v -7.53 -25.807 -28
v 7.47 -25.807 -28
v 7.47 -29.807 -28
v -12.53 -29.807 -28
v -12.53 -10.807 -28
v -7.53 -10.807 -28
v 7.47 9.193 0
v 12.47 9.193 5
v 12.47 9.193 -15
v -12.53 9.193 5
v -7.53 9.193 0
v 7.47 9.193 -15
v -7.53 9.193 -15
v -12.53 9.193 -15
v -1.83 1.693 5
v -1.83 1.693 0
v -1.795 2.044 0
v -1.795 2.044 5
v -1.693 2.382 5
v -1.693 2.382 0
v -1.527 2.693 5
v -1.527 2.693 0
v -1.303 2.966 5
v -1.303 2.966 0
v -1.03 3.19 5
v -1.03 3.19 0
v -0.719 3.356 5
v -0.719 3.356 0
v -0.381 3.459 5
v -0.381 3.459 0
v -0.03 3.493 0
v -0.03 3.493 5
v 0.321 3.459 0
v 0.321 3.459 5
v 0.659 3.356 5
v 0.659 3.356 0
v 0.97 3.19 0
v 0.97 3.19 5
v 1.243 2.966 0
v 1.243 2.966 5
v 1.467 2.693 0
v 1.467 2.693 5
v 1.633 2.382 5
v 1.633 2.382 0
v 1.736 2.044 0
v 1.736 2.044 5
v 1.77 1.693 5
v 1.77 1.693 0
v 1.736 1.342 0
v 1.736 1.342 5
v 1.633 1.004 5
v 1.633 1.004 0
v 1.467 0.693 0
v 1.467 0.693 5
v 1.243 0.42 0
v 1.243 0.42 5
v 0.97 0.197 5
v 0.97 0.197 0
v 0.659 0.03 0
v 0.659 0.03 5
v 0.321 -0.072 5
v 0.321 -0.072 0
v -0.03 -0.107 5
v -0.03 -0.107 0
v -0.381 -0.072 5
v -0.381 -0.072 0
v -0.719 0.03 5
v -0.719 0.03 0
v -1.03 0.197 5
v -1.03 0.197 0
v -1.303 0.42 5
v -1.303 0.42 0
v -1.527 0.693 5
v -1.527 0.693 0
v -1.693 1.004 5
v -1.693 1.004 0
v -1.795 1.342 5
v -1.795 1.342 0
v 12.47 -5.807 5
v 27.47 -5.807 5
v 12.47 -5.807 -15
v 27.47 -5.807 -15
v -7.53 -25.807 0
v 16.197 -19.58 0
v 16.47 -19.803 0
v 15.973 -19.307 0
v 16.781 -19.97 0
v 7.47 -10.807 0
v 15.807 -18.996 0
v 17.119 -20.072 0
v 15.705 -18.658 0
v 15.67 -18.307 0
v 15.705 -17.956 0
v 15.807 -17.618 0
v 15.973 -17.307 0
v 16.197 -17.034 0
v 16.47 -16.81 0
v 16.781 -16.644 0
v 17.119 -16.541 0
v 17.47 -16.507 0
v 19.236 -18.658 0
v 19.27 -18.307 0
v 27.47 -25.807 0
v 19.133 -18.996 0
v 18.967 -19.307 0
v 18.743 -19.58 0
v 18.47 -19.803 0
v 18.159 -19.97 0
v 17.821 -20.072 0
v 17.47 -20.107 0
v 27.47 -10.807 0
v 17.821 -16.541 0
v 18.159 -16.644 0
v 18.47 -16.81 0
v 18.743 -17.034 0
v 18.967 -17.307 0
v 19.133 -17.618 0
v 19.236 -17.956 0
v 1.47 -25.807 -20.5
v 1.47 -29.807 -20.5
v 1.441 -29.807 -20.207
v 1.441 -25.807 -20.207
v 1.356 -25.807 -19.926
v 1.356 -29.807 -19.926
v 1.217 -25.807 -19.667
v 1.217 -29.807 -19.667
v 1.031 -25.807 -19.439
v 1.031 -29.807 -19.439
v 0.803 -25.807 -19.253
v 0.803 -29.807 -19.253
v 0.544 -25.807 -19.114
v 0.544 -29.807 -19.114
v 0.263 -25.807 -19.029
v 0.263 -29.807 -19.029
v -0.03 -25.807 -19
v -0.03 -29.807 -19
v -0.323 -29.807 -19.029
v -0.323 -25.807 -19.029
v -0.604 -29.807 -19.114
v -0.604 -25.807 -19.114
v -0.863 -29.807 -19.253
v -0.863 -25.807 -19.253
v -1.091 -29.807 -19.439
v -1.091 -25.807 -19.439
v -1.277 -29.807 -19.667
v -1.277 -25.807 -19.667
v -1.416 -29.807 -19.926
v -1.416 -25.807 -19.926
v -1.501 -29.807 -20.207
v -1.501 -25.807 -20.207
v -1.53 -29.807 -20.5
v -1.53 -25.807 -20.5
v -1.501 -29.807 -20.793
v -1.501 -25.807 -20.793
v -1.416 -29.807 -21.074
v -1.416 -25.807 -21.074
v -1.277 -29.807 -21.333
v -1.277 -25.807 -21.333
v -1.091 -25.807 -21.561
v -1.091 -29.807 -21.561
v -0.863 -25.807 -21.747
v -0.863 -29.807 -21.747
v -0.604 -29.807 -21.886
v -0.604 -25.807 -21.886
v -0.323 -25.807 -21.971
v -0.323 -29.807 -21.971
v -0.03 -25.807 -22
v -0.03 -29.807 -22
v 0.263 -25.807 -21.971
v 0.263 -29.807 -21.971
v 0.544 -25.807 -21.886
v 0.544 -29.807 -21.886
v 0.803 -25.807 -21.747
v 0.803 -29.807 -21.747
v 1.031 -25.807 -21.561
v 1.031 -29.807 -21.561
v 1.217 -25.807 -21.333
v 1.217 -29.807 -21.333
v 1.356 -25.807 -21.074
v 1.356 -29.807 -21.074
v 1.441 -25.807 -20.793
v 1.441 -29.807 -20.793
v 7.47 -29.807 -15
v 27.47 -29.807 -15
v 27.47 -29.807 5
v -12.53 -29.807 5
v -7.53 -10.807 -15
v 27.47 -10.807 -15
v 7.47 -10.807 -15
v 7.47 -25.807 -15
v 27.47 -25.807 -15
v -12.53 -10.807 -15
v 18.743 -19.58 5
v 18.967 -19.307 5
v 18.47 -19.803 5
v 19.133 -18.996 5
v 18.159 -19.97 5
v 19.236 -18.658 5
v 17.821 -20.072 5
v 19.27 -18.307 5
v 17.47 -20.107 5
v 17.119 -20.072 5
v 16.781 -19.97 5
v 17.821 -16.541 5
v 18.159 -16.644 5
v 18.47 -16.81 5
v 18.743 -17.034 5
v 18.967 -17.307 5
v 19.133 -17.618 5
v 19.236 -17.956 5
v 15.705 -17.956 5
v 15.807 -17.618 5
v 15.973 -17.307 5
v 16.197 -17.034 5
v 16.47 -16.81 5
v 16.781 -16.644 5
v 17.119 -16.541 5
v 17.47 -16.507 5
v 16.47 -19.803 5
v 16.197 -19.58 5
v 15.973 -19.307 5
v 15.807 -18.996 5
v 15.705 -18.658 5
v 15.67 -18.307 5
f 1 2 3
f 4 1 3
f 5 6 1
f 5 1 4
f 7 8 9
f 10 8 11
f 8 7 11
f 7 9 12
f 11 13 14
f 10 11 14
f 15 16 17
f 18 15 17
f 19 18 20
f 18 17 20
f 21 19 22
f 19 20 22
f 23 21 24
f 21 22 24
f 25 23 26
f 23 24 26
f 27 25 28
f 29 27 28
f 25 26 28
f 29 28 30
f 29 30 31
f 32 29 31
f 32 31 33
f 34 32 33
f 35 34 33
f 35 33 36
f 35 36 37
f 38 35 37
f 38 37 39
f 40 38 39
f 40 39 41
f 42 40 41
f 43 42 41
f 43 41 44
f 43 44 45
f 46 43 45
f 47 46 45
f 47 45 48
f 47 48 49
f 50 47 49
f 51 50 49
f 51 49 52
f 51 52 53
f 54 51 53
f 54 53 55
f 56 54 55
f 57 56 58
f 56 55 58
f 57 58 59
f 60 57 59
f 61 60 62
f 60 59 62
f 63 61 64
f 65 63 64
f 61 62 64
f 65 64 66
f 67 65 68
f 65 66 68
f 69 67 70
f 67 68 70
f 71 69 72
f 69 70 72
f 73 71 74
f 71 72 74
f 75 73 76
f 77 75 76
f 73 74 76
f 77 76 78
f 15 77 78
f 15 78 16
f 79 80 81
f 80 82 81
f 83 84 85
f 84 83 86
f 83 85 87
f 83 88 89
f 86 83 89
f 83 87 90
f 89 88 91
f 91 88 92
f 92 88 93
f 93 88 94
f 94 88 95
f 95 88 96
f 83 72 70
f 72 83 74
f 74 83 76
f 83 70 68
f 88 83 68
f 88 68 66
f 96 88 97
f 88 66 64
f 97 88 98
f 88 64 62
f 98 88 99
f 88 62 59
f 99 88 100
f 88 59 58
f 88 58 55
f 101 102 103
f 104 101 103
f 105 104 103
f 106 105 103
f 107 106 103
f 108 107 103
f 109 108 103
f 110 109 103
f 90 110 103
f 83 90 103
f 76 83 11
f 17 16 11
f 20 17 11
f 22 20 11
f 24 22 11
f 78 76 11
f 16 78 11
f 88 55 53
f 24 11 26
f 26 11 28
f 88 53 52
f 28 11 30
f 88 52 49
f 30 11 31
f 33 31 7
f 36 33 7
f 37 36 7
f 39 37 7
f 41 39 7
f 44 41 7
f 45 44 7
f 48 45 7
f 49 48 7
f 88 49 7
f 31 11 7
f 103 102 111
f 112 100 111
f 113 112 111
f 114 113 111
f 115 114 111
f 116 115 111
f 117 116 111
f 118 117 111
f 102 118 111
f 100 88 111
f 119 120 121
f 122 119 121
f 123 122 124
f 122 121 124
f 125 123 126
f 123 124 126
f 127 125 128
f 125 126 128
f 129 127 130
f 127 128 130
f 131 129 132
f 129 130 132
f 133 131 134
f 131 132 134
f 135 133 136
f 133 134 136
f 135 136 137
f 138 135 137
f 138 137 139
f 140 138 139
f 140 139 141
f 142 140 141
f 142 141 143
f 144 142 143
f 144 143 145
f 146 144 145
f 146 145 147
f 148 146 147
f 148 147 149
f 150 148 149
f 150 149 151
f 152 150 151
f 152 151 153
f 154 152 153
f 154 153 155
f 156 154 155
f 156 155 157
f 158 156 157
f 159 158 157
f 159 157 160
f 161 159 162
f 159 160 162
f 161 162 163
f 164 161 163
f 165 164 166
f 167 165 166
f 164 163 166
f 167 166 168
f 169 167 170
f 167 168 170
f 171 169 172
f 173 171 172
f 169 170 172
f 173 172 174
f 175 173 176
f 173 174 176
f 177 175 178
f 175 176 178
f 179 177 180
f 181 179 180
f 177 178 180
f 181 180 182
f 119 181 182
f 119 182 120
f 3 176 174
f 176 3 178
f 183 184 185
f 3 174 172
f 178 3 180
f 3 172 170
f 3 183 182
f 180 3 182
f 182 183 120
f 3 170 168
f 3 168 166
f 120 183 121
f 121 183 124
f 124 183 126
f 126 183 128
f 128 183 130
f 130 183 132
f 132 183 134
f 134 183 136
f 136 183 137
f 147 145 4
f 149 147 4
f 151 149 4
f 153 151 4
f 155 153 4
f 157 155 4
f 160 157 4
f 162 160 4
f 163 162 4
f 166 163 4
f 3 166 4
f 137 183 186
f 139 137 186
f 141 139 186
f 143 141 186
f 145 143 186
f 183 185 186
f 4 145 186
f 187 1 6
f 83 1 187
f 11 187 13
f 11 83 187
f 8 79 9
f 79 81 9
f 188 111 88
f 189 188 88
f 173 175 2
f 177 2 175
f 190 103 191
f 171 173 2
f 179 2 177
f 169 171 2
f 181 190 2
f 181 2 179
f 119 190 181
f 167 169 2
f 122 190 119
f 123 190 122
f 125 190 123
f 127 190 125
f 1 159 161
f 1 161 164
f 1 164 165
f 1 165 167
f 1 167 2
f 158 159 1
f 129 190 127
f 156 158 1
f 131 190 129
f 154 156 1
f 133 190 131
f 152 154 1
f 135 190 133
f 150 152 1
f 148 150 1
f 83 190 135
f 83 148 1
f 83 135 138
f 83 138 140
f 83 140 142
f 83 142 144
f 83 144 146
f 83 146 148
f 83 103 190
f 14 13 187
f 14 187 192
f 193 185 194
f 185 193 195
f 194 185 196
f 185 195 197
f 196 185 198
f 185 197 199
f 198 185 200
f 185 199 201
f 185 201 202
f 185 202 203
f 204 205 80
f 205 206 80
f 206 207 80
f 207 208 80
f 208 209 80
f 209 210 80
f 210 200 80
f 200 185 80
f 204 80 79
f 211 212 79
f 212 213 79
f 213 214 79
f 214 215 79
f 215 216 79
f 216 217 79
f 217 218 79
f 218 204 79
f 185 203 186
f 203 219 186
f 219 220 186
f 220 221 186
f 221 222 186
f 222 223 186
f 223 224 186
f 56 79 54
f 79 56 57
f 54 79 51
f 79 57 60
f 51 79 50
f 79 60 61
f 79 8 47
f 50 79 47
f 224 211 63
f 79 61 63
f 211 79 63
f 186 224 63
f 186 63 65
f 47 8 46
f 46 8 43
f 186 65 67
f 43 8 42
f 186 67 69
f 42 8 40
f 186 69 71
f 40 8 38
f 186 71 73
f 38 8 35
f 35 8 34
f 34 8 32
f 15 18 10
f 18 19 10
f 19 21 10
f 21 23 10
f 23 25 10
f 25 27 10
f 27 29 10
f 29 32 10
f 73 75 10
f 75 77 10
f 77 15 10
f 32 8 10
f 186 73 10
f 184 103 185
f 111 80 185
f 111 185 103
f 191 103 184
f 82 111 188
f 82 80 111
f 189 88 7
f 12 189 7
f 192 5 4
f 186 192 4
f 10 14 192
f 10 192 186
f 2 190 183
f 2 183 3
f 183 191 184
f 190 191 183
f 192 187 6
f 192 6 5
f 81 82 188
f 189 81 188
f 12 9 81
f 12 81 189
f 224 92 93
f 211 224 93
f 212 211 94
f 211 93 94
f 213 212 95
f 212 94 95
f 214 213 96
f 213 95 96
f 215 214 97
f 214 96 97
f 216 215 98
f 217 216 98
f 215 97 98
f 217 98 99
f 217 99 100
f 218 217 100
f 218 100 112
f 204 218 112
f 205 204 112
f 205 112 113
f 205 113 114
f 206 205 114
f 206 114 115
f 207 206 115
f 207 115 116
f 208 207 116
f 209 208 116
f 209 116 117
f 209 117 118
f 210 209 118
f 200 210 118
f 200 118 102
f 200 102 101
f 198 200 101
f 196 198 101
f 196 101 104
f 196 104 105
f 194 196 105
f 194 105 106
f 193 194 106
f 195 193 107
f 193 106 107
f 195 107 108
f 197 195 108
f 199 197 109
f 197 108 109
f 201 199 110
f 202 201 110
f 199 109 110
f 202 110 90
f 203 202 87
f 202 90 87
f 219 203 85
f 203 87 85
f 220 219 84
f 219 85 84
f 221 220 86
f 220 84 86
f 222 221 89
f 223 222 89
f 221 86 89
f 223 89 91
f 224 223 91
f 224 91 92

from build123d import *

# Parameters (mm, degrees)
BOSS_EXTRUDE1_DEPTH = 5
BOSS_EXTRUDE2_DEPTH = 15
SKETCH3_W           = 5
SKETCH3_H           = 35
BOSS_EXTRUDE3_DEPTH = 15
SKETCH4_W           = 5
SKETCH4_H           = 35
BOSS_EXTRUDE4_DEPTH = 5
BOSS_EXTRUDE5_DEPTH = 5
SKETCH7_R           = 1.8
CUT_EXTRUDE1_DEPTH  = 6
SKETCH9_W           = 5
SKETCH9_H           = 15
BOSS_EXTRUDE6_DEPTH = 13
BOSS_EXTRUDE7_DEPTH = 4
SKETCH13_R          = 1.5
CUT_EXTRUDE4_DEPTH  = 40


with BuildPart() as part:
    # Sketch1 → Boss-Extrude1 (new body)
    with BuildSketch(Plane.XY):
        Polygon((-7.529880478, -25.806772908), (27.470119522, -25.806772908), (27.470119522, -10.806772908), (7.470119522, -10.806772908), (7.470119522, 9.193227092), (-7.529880478, 9.193227092), align=None)
    extrude(amount=BOSS_EXTRUDE1_DEPTH)



with BuildPart() as body_2:
    # Sketch2 → Boss-Extrude2 (new body)
    with BuildSketch(Plane(origin=(0, 0, 0), x_dir=(-1, 0, 0), z_dir=(0, 0, -1))):
        Polygon((-7.470119522, 9.193227092), (-12.470119522, 9.193227092), (-12.470119522, -5.806772908), (-27.470119522, -5.806772908), (-27.470119522, -10.806772908), (-7.470119522, -10.806772908), align=None)
    extrude(amount=BOSS_EXTRUDE2_DEPTH)


with BuildPart() as body_3:
    # Sketch3 → Boss-Extrude3 (new body)
    with BuildSketch(Plane(origin=(0, 0, 0), x_dir=(-1, 0, 0), z_dir=(0, 0, -1))):
        with Locations((10.029880478, -8.306772908)):
            Rectangle(SKETCH3_W, SKETCH3_H)
    extrude(amount=BOSS_EXTRUDE3_DEPTH)


with BuildPart() as part_1:
    add(part.part)

    add(body_3.part)  # Boss-Extrude4 merges body 3
    # Sketch4 → Boss-Extrude4 (add)
    with BuildSketch(Plane.XY):
        with Locations((-10.029880478, -8.306772908)):
            Rectangle(SKETCH4_W, SKETCH4_H)
    extrude(amount=BOSS_EXTRUDE4_DEPTH)


    add(body_2.part)  # Boss-Extrude5 merges body 2
    # Sketch5 → Boss-Extrude5 (add)
    with BuildSketch(Plane.XY):
        Polygon((7.470119522, 9.193227092), (7.470119522, -10.806772908), (27.470119522, -10.806772908), (27.470119522, -5.806772908), (12.470119522, -5.806772908), (12.470119522, 9.193227092), align=None)
    extrude(amount=BOSS_EXTRUDE5_DEPTH)

    # Sketch7 → Cut-Extrude1 (cut, through all)
    with BuildSketch(Plane(origin=(0, 0, 0), x_dir=(-1, 0, 0), z_dir=(0, 0, -1))):
        with Locations((0.029880478, 1.693227092)):
            Circle(SKETCH7_R)
        with Locations((-17.470119522, -18.306772908)):
            Circle(SKETCH7_R)
    extrude(amount=-CUT_EXTRUDE1_DEPTH, mode=Mode.SUBTRACT)

    # Sketch9 → Boss-Extrude6 (add)
    with BuildSketch(Plane(origin=(0, 0, -15), x_dir=(-1, 0, 0), z_dir=(0, 0, -1))):
        with Locations((10.029880478, -18.306772908)):
            Rectangle(SKETCH9_W, SKETCH9_H)
    extrude(amount=BOSS_EXTRUDE6_DEPTH)

    # Sketch12 → Boss-Extrude7 (add)
    with BuildSketch(Plane.XZ.offset(25.806772908)):
        Polygon((7.470119522, -28), (-12.529880478, -28), (-12.529880478, 5), (7.470119522, 5), (27.470119522, 5), (27.470119522, -15), (7.470119522, -15), align=None)
    extrude(amount=BOSS_EXTRUDE7_DEPTH)

    # Sketch13 → Cut-Extrude4 (cut, through all)
    with BuildSketch(Plane.XZ.offset(29.806772908)):
        with Locations((-0.029880478, -20.5)):
            Circle(SKETCH13_R)
    extrude(amount=-CUT_EXTRUDE4_DEPTH, mode=Mode.SUBTRACT)


solid = part_1.part
